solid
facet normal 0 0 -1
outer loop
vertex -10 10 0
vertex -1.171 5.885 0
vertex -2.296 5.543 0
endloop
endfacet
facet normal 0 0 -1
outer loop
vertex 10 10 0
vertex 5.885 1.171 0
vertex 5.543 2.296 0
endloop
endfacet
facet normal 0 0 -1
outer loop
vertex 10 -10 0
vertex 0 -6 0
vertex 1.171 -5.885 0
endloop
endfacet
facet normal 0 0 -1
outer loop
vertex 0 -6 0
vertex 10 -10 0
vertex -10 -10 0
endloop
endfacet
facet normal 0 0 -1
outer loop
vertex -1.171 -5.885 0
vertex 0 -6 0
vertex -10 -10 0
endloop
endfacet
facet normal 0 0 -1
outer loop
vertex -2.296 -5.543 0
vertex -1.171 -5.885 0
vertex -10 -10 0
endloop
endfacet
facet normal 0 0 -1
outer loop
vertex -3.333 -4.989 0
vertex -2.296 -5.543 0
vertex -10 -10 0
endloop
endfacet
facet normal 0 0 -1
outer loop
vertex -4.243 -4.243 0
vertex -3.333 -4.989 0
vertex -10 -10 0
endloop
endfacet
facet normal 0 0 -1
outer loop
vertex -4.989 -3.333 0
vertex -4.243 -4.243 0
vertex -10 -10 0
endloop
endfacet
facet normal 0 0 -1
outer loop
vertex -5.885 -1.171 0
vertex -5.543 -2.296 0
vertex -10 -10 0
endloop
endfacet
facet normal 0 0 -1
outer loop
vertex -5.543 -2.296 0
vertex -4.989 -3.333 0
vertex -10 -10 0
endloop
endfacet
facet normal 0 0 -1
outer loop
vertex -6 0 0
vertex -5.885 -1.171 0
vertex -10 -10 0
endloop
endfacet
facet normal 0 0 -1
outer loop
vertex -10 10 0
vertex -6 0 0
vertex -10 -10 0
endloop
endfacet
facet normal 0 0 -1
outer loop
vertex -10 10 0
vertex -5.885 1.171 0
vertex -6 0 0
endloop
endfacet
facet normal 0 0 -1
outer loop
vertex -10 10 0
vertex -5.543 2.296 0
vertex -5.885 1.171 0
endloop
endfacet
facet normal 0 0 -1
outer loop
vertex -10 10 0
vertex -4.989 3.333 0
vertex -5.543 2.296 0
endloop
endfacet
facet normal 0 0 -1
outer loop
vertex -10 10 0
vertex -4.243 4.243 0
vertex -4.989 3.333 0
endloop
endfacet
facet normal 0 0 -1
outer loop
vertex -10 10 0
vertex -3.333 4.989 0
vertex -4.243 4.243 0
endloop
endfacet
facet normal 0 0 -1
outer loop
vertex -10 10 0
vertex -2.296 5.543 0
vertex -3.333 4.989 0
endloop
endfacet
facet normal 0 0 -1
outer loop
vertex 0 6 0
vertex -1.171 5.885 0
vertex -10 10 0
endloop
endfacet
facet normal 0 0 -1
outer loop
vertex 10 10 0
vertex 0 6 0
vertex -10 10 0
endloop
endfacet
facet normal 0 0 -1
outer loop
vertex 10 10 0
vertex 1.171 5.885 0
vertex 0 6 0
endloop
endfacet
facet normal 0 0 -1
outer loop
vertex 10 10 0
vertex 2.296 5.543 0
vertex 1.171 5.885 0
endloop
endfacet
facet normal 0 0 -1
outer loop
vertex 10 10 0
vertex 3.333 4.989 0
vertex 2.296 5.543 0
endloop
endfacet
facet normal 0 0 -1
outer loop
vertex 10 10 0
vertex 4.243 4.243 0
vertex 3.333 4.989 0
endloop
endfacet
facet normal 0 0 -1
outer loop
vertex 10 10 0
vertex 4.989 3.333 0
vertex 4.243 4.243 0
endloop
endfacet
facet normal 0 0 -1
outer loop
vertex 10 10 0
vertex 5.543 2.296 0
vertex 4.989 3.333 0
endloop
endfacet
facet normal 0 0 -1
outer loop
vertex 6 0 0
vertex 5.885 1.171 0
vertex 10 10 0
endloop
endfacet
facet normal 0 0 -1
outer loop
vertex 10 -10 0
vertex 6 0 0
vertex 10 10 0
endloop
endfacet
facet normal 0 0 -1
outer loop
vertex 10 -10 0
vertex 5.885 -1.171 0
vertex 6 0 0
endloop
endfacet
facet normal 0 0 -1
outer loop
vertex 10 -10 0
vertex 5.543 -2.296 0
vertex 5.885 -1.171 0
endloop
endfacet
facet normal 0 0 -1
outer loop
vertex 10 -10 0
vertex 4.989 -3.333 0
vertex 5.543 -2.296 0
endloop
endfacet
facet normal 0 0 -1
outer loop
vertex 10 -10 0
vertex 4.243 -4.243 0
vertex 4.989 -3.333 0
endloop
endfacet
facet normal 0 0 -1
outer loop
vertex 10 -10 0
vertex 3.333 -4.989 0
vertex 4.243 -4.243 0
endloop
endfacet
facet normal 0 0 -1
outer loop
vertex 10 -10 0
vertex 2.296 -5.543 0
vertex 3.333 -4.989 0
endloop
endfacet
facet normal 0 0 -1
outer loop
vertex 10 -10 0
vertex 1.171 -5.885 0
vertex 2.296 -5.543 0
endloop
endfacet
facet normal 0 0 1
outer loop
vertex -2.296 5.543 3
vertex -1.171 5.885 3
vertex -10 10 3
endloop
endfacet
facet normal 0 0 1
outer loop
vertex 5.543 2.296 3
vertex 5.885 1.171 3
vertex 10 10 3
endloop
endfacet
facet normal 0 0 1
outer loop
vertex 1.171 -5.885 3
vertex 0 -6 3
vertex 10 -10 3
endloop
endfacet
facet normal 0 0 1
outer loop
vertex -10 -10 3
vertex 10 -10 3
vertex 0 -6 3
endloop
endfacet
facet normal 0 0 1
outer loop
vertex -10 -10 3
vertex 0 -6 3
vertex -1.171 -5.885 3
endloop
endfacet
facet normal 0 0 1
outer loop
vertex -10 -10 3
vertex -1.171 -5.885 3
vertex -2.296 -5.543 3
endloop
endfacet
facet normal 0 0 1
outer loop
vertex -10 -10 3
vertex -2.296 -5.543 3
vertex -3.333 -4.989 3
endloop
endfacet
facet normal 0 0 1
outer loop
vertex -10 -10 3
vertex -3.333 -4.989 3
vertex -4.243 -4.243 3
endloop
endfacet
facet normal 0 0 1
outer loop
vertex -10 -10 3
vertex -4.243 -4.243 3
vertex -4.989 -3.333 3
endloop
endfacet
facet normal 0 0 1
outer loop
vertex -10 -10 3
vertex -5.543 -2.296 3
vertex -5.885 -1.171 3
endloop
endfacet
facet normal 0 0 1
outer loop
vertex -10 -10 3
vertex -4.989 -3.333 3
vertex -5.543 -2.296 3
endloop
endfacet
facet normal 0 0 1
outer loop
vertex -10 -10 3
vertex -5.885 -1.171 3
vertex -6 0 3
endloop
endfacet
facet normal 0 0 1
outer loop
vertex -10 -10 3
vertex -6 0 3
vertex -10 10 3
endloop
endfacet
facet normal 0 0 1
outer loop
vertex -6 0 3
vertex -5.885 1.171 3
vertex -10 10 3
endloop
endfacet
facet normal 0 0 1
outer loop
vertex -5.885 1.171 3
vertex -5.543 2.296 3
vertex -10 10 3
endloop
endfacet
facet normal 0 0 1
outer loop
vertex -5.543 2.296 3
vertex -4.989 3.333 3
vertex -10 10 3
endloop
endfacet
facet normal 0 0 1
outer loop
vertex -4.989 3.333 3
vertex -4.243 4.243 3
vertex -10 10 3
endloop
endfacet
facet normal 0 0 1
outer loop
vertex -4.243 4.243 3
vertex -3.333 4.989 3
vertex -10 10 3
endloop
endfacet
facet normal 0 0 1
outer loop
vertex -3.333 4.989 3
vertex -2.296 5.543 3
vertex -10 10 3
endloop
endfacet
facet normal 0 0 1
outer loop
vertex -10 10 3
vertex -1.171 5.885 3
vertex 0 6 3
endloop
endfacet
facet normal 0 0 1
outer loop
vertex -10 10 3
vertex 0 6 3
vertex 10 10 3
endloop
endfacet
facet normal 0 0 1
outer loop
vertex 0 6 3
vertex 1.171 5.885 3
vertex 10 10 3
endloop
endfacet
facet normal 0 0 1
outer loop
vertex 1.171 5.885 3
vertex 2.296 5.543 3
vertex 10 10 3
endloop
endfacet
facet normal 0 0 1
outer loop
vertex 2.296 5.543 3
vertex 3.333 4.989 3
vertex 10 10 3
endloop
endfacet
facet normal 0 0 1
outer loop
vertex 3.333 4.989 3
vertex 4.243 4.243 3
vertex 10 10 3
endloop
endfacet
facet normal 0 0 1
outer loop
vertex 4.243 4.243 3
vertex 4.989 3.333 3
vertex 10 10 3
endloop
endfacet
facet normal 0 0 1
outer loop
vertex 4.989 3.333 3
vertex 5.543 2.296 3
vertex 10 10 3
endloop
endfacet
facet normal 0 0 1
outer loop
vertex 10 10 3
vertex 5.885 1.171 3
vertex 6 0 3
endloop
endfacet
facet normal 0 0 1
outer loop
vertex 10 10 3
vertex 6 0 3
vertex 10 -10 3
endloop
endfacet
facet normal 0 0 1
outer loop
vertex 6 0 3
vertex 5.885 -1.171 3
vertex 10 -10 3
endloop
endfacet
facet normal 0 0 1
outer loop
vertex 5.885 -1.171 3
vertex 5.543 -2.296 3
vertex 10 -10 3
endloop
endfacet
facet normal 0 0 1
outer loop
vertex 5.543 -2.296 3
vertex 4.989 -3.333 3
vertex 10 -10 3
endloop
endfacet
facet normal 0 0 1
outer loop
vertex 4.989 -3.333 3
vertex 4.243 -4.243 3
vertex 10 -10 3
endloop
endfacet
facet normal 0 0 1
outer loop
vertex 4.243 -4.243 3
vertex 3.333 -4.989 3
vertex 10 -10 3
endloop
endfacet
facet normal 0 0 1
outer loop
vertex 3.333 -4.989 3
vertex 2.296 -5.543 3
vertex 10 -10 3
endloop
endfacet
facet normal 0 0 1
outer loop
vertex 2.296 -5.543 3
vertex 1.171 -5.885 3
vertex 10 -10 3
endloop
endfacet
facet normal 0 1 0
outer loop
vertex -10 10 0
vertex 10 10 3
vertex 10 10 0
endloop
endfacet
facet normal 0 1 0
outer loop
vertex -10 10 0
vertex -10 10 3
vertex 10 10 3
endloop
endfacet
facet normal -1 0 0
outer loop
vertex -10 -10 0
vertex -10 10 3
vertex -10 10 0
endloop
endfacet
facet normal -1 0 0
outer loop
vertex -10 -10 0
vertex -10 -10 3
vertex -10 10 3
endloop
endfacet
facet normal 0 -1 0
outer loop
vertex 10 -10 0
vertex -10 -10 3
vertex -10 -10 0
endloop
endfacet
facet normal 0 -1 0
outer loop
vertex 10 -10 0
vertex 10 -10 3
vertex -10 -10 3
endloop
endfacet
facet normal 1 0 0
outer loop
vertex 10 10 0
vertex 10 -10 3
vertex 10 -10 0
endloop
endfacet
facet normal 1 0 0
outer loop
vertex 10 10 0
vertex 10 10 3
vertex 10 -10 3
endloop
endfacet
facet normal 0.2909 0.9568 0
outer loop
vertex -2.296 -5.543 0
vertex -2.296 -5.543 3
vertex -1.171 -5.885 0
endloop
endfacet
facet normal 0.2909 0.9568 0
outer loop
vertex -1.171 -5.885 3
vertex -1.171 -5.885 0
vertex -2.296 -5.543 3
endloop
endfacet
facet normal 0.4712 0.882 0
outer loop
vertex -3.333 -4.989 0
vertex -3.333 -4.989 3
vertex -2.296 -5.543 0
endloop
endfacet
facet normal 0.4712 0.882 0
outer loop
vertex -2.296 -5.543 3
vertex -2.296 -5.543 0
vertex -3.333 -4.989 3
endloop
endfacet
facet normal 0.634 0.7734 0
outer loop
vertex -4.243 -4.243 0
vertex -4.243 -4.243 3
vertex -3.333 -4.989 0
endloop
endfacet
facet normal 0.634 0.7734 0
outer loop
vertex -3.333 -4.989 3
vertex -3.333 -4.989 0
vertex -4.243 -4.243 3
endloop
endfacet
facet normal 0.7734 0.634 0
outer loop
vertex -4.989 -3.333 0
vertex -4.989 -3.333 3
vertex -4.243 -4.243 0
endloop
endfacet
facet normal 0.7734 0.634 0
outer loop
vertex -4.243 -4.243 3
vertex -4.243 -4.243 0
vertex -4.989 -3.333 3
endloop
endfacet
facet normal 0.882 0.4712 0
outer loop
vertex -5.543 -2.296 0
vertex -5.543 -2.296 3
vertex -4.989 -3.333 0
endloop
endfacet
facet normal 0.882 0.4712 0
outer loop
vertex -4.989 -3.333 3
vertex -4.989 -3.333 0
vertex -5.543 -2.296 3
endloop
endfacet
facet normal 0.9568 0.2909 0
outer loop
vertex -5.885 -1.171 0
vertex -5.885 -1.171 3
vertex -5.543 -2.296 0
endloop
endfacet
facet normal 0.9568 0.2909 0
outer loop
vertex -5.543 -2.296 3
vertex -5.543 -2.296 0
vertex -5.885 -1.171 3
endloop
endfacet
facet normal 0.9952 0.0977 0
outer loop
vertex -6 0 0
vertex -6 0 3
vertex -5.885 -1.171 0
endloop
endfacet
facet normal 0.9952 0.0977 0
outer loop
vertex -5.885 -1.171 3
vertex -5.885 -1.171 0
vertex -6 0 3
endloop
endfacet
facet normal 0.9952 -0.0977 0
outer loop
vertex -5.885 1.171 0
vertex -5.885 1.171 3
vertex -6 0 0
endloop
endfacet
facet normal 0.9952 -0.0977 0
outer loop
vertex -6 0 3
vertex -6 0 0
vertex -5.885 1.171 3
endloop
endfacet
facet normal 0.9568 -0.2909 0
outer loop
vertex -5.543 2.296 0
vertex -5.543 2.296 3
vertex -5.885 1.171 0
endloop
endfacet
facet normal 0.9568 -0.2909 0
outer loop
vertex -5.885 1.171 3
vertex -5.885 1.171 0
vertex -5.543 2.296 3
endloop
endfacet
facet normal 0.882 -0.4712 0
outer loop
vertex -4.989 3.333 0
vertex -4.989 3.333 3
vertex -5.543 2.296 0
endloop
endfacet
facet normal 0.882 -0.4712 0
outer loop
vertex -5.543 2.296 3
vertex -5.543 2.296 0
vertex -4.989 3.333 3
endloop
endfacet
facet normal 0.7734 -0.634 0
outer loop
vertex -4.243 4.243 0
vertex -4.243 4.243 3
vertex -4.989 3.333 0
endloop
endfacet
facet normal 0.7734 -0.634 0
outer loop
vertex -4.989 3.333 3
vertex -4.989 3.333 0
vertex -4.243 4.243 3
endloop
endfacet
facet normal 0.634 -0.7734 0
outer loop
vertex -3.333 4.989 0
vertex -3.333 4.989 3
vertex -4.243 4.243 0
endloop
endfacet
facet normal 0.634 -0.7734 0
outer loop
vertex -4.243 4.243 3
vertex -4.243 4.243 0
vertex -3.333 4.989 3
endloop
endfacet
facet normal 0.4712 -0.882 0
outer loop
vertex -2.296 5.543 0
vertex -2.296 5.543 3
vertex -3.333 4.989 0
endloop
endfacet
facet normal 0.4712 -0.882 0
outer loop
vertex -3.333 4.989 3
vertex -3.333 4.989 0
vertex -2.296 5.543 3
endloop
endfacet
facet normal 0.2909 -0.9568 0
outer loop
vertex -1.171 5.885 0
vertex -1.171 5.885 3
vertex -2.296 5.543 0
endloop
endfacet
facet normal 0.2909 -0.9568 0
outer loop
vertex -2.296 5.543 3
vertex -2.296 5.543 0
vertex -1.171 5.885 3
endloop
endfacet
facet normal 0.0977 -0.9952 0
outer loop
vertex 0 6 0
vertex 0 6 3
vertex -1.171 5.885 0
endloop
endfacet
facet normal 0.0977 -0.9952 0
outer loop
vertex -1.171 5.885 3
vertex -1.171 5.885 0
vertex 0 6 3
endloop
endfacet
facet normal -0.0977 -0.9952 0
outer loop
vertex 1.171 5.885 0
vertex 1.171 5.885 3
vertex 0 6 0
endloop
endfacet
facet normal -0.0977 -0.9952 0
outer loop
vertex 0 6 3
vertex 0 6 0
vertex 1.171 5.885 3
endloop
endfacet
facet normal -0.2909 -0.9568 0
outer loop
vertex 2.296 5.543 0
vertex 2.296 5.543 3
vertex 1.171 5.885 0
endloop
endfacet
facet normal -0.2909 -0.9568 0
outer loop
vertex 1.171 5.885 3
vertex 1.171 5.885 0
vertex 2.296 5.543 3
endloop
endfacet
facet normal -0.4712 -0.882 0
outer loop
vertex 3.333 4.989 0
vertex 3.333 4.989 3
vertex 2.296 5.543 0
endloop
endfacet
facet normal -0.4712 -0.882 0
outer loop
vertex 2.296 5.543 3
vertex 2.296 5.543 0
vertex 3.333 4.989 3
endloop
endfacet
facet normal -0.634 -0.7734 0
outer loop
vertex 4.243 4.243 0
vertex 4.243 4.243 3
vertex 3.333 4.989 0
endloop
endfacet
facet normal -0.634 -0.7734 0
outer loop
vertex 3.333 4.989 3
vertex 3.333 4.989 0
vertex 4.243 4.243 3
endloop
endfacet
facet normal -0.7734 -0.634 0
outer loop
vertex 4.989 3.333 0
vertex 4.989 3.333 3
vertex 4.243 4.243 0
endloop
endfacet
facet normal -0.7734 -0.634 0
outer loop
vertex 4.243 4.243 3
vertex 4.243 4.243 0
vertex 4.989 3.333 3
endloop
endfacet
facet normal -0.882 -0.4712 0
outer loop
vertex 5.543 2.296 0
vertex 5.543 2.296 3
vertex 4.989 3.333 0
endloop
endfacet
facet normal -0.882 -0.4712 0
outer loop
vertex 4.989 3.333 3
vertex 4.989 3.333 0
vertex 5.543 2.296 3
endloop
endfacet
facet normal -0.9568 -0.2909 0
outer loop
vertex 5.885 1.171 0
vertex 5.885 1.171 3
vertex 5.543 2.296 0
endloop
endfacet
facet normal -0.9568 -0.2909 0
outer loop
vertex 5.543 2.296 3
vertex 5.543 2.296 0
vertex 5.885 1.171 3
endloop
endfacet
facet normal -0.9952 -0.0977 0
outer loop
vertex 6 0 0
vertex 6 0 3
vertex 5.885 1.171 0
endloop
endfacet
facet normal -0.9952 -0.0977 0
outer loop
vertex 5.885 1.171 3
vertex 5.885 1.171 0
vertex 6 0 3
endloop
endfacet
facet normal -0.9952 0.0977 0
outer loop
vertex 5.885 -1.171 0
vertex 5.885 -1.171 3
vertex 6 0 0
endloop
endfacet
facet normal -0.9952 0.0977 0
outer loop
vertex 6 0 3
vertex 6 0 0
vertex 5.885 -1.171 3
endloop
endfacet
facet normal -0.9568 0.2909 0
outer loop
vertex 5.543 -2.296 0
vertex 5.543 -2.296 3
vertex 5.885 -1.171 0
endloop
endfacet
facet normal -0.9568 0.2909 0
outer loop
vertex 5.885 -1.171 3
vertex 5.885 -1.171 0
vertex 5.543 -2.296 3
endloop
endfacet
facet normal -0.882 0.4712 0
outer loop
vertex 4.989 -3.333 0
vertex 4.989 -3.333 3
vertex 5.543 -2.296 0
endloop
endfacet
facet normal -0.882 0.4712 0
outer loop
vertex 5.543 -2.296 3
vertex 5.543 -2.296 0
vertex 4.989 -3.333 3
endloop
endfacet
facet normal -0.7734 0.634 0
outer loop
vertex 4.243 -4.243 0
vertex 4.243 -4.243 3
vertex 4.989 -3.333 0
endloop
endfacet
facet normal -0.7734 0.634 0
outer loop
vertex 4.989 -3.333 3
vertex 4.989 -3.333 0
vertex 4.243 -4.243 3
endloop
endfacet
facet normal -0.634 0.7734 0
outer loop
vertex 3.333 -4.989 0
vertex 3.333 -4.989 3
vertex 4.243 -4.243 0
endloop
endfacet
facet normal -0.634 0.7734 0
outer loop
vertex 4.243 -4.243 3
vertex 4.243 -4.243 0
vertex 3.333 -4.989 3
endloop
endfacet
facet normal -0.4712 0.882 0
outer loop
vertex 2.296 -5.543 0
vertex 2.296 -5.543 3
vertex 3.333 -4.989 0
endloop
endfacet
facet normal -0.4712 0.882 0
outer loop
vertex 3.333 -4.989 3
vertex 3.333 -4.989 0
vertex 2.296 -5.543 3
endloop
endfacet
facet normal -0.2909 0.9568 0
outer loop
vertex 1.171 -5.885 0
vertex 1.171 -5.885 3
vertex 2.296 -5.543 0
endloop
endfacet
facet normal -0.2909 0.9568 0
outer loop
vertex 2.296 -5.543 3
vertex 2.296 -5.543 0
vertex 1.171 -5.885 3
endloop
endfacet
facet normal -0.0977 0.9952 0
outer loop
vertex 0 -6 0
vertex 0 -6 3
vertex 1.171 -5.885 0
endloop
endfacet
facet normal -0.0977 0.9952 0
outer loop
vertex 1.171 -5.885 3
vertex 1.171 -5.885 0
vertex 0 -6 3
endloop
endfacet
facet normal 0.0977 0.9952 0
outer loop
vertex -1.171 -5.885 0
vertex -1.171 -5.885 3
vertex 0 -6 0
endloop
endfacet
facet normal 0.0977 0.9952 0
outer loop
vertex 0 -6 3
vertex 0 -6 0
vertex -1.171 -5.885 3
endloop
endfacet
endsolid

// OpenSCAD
// D6 — a 2D boolean used as an extrusion profile. `profile_boundary` recognised
// only literal primitives, so a difference of two shapes reported `Unknown` and
// sent the whole side wall through unclassified.
linear_extrude(3) difference() {
  square(20, center = true);
  circle(6, $fn = 32);
}
